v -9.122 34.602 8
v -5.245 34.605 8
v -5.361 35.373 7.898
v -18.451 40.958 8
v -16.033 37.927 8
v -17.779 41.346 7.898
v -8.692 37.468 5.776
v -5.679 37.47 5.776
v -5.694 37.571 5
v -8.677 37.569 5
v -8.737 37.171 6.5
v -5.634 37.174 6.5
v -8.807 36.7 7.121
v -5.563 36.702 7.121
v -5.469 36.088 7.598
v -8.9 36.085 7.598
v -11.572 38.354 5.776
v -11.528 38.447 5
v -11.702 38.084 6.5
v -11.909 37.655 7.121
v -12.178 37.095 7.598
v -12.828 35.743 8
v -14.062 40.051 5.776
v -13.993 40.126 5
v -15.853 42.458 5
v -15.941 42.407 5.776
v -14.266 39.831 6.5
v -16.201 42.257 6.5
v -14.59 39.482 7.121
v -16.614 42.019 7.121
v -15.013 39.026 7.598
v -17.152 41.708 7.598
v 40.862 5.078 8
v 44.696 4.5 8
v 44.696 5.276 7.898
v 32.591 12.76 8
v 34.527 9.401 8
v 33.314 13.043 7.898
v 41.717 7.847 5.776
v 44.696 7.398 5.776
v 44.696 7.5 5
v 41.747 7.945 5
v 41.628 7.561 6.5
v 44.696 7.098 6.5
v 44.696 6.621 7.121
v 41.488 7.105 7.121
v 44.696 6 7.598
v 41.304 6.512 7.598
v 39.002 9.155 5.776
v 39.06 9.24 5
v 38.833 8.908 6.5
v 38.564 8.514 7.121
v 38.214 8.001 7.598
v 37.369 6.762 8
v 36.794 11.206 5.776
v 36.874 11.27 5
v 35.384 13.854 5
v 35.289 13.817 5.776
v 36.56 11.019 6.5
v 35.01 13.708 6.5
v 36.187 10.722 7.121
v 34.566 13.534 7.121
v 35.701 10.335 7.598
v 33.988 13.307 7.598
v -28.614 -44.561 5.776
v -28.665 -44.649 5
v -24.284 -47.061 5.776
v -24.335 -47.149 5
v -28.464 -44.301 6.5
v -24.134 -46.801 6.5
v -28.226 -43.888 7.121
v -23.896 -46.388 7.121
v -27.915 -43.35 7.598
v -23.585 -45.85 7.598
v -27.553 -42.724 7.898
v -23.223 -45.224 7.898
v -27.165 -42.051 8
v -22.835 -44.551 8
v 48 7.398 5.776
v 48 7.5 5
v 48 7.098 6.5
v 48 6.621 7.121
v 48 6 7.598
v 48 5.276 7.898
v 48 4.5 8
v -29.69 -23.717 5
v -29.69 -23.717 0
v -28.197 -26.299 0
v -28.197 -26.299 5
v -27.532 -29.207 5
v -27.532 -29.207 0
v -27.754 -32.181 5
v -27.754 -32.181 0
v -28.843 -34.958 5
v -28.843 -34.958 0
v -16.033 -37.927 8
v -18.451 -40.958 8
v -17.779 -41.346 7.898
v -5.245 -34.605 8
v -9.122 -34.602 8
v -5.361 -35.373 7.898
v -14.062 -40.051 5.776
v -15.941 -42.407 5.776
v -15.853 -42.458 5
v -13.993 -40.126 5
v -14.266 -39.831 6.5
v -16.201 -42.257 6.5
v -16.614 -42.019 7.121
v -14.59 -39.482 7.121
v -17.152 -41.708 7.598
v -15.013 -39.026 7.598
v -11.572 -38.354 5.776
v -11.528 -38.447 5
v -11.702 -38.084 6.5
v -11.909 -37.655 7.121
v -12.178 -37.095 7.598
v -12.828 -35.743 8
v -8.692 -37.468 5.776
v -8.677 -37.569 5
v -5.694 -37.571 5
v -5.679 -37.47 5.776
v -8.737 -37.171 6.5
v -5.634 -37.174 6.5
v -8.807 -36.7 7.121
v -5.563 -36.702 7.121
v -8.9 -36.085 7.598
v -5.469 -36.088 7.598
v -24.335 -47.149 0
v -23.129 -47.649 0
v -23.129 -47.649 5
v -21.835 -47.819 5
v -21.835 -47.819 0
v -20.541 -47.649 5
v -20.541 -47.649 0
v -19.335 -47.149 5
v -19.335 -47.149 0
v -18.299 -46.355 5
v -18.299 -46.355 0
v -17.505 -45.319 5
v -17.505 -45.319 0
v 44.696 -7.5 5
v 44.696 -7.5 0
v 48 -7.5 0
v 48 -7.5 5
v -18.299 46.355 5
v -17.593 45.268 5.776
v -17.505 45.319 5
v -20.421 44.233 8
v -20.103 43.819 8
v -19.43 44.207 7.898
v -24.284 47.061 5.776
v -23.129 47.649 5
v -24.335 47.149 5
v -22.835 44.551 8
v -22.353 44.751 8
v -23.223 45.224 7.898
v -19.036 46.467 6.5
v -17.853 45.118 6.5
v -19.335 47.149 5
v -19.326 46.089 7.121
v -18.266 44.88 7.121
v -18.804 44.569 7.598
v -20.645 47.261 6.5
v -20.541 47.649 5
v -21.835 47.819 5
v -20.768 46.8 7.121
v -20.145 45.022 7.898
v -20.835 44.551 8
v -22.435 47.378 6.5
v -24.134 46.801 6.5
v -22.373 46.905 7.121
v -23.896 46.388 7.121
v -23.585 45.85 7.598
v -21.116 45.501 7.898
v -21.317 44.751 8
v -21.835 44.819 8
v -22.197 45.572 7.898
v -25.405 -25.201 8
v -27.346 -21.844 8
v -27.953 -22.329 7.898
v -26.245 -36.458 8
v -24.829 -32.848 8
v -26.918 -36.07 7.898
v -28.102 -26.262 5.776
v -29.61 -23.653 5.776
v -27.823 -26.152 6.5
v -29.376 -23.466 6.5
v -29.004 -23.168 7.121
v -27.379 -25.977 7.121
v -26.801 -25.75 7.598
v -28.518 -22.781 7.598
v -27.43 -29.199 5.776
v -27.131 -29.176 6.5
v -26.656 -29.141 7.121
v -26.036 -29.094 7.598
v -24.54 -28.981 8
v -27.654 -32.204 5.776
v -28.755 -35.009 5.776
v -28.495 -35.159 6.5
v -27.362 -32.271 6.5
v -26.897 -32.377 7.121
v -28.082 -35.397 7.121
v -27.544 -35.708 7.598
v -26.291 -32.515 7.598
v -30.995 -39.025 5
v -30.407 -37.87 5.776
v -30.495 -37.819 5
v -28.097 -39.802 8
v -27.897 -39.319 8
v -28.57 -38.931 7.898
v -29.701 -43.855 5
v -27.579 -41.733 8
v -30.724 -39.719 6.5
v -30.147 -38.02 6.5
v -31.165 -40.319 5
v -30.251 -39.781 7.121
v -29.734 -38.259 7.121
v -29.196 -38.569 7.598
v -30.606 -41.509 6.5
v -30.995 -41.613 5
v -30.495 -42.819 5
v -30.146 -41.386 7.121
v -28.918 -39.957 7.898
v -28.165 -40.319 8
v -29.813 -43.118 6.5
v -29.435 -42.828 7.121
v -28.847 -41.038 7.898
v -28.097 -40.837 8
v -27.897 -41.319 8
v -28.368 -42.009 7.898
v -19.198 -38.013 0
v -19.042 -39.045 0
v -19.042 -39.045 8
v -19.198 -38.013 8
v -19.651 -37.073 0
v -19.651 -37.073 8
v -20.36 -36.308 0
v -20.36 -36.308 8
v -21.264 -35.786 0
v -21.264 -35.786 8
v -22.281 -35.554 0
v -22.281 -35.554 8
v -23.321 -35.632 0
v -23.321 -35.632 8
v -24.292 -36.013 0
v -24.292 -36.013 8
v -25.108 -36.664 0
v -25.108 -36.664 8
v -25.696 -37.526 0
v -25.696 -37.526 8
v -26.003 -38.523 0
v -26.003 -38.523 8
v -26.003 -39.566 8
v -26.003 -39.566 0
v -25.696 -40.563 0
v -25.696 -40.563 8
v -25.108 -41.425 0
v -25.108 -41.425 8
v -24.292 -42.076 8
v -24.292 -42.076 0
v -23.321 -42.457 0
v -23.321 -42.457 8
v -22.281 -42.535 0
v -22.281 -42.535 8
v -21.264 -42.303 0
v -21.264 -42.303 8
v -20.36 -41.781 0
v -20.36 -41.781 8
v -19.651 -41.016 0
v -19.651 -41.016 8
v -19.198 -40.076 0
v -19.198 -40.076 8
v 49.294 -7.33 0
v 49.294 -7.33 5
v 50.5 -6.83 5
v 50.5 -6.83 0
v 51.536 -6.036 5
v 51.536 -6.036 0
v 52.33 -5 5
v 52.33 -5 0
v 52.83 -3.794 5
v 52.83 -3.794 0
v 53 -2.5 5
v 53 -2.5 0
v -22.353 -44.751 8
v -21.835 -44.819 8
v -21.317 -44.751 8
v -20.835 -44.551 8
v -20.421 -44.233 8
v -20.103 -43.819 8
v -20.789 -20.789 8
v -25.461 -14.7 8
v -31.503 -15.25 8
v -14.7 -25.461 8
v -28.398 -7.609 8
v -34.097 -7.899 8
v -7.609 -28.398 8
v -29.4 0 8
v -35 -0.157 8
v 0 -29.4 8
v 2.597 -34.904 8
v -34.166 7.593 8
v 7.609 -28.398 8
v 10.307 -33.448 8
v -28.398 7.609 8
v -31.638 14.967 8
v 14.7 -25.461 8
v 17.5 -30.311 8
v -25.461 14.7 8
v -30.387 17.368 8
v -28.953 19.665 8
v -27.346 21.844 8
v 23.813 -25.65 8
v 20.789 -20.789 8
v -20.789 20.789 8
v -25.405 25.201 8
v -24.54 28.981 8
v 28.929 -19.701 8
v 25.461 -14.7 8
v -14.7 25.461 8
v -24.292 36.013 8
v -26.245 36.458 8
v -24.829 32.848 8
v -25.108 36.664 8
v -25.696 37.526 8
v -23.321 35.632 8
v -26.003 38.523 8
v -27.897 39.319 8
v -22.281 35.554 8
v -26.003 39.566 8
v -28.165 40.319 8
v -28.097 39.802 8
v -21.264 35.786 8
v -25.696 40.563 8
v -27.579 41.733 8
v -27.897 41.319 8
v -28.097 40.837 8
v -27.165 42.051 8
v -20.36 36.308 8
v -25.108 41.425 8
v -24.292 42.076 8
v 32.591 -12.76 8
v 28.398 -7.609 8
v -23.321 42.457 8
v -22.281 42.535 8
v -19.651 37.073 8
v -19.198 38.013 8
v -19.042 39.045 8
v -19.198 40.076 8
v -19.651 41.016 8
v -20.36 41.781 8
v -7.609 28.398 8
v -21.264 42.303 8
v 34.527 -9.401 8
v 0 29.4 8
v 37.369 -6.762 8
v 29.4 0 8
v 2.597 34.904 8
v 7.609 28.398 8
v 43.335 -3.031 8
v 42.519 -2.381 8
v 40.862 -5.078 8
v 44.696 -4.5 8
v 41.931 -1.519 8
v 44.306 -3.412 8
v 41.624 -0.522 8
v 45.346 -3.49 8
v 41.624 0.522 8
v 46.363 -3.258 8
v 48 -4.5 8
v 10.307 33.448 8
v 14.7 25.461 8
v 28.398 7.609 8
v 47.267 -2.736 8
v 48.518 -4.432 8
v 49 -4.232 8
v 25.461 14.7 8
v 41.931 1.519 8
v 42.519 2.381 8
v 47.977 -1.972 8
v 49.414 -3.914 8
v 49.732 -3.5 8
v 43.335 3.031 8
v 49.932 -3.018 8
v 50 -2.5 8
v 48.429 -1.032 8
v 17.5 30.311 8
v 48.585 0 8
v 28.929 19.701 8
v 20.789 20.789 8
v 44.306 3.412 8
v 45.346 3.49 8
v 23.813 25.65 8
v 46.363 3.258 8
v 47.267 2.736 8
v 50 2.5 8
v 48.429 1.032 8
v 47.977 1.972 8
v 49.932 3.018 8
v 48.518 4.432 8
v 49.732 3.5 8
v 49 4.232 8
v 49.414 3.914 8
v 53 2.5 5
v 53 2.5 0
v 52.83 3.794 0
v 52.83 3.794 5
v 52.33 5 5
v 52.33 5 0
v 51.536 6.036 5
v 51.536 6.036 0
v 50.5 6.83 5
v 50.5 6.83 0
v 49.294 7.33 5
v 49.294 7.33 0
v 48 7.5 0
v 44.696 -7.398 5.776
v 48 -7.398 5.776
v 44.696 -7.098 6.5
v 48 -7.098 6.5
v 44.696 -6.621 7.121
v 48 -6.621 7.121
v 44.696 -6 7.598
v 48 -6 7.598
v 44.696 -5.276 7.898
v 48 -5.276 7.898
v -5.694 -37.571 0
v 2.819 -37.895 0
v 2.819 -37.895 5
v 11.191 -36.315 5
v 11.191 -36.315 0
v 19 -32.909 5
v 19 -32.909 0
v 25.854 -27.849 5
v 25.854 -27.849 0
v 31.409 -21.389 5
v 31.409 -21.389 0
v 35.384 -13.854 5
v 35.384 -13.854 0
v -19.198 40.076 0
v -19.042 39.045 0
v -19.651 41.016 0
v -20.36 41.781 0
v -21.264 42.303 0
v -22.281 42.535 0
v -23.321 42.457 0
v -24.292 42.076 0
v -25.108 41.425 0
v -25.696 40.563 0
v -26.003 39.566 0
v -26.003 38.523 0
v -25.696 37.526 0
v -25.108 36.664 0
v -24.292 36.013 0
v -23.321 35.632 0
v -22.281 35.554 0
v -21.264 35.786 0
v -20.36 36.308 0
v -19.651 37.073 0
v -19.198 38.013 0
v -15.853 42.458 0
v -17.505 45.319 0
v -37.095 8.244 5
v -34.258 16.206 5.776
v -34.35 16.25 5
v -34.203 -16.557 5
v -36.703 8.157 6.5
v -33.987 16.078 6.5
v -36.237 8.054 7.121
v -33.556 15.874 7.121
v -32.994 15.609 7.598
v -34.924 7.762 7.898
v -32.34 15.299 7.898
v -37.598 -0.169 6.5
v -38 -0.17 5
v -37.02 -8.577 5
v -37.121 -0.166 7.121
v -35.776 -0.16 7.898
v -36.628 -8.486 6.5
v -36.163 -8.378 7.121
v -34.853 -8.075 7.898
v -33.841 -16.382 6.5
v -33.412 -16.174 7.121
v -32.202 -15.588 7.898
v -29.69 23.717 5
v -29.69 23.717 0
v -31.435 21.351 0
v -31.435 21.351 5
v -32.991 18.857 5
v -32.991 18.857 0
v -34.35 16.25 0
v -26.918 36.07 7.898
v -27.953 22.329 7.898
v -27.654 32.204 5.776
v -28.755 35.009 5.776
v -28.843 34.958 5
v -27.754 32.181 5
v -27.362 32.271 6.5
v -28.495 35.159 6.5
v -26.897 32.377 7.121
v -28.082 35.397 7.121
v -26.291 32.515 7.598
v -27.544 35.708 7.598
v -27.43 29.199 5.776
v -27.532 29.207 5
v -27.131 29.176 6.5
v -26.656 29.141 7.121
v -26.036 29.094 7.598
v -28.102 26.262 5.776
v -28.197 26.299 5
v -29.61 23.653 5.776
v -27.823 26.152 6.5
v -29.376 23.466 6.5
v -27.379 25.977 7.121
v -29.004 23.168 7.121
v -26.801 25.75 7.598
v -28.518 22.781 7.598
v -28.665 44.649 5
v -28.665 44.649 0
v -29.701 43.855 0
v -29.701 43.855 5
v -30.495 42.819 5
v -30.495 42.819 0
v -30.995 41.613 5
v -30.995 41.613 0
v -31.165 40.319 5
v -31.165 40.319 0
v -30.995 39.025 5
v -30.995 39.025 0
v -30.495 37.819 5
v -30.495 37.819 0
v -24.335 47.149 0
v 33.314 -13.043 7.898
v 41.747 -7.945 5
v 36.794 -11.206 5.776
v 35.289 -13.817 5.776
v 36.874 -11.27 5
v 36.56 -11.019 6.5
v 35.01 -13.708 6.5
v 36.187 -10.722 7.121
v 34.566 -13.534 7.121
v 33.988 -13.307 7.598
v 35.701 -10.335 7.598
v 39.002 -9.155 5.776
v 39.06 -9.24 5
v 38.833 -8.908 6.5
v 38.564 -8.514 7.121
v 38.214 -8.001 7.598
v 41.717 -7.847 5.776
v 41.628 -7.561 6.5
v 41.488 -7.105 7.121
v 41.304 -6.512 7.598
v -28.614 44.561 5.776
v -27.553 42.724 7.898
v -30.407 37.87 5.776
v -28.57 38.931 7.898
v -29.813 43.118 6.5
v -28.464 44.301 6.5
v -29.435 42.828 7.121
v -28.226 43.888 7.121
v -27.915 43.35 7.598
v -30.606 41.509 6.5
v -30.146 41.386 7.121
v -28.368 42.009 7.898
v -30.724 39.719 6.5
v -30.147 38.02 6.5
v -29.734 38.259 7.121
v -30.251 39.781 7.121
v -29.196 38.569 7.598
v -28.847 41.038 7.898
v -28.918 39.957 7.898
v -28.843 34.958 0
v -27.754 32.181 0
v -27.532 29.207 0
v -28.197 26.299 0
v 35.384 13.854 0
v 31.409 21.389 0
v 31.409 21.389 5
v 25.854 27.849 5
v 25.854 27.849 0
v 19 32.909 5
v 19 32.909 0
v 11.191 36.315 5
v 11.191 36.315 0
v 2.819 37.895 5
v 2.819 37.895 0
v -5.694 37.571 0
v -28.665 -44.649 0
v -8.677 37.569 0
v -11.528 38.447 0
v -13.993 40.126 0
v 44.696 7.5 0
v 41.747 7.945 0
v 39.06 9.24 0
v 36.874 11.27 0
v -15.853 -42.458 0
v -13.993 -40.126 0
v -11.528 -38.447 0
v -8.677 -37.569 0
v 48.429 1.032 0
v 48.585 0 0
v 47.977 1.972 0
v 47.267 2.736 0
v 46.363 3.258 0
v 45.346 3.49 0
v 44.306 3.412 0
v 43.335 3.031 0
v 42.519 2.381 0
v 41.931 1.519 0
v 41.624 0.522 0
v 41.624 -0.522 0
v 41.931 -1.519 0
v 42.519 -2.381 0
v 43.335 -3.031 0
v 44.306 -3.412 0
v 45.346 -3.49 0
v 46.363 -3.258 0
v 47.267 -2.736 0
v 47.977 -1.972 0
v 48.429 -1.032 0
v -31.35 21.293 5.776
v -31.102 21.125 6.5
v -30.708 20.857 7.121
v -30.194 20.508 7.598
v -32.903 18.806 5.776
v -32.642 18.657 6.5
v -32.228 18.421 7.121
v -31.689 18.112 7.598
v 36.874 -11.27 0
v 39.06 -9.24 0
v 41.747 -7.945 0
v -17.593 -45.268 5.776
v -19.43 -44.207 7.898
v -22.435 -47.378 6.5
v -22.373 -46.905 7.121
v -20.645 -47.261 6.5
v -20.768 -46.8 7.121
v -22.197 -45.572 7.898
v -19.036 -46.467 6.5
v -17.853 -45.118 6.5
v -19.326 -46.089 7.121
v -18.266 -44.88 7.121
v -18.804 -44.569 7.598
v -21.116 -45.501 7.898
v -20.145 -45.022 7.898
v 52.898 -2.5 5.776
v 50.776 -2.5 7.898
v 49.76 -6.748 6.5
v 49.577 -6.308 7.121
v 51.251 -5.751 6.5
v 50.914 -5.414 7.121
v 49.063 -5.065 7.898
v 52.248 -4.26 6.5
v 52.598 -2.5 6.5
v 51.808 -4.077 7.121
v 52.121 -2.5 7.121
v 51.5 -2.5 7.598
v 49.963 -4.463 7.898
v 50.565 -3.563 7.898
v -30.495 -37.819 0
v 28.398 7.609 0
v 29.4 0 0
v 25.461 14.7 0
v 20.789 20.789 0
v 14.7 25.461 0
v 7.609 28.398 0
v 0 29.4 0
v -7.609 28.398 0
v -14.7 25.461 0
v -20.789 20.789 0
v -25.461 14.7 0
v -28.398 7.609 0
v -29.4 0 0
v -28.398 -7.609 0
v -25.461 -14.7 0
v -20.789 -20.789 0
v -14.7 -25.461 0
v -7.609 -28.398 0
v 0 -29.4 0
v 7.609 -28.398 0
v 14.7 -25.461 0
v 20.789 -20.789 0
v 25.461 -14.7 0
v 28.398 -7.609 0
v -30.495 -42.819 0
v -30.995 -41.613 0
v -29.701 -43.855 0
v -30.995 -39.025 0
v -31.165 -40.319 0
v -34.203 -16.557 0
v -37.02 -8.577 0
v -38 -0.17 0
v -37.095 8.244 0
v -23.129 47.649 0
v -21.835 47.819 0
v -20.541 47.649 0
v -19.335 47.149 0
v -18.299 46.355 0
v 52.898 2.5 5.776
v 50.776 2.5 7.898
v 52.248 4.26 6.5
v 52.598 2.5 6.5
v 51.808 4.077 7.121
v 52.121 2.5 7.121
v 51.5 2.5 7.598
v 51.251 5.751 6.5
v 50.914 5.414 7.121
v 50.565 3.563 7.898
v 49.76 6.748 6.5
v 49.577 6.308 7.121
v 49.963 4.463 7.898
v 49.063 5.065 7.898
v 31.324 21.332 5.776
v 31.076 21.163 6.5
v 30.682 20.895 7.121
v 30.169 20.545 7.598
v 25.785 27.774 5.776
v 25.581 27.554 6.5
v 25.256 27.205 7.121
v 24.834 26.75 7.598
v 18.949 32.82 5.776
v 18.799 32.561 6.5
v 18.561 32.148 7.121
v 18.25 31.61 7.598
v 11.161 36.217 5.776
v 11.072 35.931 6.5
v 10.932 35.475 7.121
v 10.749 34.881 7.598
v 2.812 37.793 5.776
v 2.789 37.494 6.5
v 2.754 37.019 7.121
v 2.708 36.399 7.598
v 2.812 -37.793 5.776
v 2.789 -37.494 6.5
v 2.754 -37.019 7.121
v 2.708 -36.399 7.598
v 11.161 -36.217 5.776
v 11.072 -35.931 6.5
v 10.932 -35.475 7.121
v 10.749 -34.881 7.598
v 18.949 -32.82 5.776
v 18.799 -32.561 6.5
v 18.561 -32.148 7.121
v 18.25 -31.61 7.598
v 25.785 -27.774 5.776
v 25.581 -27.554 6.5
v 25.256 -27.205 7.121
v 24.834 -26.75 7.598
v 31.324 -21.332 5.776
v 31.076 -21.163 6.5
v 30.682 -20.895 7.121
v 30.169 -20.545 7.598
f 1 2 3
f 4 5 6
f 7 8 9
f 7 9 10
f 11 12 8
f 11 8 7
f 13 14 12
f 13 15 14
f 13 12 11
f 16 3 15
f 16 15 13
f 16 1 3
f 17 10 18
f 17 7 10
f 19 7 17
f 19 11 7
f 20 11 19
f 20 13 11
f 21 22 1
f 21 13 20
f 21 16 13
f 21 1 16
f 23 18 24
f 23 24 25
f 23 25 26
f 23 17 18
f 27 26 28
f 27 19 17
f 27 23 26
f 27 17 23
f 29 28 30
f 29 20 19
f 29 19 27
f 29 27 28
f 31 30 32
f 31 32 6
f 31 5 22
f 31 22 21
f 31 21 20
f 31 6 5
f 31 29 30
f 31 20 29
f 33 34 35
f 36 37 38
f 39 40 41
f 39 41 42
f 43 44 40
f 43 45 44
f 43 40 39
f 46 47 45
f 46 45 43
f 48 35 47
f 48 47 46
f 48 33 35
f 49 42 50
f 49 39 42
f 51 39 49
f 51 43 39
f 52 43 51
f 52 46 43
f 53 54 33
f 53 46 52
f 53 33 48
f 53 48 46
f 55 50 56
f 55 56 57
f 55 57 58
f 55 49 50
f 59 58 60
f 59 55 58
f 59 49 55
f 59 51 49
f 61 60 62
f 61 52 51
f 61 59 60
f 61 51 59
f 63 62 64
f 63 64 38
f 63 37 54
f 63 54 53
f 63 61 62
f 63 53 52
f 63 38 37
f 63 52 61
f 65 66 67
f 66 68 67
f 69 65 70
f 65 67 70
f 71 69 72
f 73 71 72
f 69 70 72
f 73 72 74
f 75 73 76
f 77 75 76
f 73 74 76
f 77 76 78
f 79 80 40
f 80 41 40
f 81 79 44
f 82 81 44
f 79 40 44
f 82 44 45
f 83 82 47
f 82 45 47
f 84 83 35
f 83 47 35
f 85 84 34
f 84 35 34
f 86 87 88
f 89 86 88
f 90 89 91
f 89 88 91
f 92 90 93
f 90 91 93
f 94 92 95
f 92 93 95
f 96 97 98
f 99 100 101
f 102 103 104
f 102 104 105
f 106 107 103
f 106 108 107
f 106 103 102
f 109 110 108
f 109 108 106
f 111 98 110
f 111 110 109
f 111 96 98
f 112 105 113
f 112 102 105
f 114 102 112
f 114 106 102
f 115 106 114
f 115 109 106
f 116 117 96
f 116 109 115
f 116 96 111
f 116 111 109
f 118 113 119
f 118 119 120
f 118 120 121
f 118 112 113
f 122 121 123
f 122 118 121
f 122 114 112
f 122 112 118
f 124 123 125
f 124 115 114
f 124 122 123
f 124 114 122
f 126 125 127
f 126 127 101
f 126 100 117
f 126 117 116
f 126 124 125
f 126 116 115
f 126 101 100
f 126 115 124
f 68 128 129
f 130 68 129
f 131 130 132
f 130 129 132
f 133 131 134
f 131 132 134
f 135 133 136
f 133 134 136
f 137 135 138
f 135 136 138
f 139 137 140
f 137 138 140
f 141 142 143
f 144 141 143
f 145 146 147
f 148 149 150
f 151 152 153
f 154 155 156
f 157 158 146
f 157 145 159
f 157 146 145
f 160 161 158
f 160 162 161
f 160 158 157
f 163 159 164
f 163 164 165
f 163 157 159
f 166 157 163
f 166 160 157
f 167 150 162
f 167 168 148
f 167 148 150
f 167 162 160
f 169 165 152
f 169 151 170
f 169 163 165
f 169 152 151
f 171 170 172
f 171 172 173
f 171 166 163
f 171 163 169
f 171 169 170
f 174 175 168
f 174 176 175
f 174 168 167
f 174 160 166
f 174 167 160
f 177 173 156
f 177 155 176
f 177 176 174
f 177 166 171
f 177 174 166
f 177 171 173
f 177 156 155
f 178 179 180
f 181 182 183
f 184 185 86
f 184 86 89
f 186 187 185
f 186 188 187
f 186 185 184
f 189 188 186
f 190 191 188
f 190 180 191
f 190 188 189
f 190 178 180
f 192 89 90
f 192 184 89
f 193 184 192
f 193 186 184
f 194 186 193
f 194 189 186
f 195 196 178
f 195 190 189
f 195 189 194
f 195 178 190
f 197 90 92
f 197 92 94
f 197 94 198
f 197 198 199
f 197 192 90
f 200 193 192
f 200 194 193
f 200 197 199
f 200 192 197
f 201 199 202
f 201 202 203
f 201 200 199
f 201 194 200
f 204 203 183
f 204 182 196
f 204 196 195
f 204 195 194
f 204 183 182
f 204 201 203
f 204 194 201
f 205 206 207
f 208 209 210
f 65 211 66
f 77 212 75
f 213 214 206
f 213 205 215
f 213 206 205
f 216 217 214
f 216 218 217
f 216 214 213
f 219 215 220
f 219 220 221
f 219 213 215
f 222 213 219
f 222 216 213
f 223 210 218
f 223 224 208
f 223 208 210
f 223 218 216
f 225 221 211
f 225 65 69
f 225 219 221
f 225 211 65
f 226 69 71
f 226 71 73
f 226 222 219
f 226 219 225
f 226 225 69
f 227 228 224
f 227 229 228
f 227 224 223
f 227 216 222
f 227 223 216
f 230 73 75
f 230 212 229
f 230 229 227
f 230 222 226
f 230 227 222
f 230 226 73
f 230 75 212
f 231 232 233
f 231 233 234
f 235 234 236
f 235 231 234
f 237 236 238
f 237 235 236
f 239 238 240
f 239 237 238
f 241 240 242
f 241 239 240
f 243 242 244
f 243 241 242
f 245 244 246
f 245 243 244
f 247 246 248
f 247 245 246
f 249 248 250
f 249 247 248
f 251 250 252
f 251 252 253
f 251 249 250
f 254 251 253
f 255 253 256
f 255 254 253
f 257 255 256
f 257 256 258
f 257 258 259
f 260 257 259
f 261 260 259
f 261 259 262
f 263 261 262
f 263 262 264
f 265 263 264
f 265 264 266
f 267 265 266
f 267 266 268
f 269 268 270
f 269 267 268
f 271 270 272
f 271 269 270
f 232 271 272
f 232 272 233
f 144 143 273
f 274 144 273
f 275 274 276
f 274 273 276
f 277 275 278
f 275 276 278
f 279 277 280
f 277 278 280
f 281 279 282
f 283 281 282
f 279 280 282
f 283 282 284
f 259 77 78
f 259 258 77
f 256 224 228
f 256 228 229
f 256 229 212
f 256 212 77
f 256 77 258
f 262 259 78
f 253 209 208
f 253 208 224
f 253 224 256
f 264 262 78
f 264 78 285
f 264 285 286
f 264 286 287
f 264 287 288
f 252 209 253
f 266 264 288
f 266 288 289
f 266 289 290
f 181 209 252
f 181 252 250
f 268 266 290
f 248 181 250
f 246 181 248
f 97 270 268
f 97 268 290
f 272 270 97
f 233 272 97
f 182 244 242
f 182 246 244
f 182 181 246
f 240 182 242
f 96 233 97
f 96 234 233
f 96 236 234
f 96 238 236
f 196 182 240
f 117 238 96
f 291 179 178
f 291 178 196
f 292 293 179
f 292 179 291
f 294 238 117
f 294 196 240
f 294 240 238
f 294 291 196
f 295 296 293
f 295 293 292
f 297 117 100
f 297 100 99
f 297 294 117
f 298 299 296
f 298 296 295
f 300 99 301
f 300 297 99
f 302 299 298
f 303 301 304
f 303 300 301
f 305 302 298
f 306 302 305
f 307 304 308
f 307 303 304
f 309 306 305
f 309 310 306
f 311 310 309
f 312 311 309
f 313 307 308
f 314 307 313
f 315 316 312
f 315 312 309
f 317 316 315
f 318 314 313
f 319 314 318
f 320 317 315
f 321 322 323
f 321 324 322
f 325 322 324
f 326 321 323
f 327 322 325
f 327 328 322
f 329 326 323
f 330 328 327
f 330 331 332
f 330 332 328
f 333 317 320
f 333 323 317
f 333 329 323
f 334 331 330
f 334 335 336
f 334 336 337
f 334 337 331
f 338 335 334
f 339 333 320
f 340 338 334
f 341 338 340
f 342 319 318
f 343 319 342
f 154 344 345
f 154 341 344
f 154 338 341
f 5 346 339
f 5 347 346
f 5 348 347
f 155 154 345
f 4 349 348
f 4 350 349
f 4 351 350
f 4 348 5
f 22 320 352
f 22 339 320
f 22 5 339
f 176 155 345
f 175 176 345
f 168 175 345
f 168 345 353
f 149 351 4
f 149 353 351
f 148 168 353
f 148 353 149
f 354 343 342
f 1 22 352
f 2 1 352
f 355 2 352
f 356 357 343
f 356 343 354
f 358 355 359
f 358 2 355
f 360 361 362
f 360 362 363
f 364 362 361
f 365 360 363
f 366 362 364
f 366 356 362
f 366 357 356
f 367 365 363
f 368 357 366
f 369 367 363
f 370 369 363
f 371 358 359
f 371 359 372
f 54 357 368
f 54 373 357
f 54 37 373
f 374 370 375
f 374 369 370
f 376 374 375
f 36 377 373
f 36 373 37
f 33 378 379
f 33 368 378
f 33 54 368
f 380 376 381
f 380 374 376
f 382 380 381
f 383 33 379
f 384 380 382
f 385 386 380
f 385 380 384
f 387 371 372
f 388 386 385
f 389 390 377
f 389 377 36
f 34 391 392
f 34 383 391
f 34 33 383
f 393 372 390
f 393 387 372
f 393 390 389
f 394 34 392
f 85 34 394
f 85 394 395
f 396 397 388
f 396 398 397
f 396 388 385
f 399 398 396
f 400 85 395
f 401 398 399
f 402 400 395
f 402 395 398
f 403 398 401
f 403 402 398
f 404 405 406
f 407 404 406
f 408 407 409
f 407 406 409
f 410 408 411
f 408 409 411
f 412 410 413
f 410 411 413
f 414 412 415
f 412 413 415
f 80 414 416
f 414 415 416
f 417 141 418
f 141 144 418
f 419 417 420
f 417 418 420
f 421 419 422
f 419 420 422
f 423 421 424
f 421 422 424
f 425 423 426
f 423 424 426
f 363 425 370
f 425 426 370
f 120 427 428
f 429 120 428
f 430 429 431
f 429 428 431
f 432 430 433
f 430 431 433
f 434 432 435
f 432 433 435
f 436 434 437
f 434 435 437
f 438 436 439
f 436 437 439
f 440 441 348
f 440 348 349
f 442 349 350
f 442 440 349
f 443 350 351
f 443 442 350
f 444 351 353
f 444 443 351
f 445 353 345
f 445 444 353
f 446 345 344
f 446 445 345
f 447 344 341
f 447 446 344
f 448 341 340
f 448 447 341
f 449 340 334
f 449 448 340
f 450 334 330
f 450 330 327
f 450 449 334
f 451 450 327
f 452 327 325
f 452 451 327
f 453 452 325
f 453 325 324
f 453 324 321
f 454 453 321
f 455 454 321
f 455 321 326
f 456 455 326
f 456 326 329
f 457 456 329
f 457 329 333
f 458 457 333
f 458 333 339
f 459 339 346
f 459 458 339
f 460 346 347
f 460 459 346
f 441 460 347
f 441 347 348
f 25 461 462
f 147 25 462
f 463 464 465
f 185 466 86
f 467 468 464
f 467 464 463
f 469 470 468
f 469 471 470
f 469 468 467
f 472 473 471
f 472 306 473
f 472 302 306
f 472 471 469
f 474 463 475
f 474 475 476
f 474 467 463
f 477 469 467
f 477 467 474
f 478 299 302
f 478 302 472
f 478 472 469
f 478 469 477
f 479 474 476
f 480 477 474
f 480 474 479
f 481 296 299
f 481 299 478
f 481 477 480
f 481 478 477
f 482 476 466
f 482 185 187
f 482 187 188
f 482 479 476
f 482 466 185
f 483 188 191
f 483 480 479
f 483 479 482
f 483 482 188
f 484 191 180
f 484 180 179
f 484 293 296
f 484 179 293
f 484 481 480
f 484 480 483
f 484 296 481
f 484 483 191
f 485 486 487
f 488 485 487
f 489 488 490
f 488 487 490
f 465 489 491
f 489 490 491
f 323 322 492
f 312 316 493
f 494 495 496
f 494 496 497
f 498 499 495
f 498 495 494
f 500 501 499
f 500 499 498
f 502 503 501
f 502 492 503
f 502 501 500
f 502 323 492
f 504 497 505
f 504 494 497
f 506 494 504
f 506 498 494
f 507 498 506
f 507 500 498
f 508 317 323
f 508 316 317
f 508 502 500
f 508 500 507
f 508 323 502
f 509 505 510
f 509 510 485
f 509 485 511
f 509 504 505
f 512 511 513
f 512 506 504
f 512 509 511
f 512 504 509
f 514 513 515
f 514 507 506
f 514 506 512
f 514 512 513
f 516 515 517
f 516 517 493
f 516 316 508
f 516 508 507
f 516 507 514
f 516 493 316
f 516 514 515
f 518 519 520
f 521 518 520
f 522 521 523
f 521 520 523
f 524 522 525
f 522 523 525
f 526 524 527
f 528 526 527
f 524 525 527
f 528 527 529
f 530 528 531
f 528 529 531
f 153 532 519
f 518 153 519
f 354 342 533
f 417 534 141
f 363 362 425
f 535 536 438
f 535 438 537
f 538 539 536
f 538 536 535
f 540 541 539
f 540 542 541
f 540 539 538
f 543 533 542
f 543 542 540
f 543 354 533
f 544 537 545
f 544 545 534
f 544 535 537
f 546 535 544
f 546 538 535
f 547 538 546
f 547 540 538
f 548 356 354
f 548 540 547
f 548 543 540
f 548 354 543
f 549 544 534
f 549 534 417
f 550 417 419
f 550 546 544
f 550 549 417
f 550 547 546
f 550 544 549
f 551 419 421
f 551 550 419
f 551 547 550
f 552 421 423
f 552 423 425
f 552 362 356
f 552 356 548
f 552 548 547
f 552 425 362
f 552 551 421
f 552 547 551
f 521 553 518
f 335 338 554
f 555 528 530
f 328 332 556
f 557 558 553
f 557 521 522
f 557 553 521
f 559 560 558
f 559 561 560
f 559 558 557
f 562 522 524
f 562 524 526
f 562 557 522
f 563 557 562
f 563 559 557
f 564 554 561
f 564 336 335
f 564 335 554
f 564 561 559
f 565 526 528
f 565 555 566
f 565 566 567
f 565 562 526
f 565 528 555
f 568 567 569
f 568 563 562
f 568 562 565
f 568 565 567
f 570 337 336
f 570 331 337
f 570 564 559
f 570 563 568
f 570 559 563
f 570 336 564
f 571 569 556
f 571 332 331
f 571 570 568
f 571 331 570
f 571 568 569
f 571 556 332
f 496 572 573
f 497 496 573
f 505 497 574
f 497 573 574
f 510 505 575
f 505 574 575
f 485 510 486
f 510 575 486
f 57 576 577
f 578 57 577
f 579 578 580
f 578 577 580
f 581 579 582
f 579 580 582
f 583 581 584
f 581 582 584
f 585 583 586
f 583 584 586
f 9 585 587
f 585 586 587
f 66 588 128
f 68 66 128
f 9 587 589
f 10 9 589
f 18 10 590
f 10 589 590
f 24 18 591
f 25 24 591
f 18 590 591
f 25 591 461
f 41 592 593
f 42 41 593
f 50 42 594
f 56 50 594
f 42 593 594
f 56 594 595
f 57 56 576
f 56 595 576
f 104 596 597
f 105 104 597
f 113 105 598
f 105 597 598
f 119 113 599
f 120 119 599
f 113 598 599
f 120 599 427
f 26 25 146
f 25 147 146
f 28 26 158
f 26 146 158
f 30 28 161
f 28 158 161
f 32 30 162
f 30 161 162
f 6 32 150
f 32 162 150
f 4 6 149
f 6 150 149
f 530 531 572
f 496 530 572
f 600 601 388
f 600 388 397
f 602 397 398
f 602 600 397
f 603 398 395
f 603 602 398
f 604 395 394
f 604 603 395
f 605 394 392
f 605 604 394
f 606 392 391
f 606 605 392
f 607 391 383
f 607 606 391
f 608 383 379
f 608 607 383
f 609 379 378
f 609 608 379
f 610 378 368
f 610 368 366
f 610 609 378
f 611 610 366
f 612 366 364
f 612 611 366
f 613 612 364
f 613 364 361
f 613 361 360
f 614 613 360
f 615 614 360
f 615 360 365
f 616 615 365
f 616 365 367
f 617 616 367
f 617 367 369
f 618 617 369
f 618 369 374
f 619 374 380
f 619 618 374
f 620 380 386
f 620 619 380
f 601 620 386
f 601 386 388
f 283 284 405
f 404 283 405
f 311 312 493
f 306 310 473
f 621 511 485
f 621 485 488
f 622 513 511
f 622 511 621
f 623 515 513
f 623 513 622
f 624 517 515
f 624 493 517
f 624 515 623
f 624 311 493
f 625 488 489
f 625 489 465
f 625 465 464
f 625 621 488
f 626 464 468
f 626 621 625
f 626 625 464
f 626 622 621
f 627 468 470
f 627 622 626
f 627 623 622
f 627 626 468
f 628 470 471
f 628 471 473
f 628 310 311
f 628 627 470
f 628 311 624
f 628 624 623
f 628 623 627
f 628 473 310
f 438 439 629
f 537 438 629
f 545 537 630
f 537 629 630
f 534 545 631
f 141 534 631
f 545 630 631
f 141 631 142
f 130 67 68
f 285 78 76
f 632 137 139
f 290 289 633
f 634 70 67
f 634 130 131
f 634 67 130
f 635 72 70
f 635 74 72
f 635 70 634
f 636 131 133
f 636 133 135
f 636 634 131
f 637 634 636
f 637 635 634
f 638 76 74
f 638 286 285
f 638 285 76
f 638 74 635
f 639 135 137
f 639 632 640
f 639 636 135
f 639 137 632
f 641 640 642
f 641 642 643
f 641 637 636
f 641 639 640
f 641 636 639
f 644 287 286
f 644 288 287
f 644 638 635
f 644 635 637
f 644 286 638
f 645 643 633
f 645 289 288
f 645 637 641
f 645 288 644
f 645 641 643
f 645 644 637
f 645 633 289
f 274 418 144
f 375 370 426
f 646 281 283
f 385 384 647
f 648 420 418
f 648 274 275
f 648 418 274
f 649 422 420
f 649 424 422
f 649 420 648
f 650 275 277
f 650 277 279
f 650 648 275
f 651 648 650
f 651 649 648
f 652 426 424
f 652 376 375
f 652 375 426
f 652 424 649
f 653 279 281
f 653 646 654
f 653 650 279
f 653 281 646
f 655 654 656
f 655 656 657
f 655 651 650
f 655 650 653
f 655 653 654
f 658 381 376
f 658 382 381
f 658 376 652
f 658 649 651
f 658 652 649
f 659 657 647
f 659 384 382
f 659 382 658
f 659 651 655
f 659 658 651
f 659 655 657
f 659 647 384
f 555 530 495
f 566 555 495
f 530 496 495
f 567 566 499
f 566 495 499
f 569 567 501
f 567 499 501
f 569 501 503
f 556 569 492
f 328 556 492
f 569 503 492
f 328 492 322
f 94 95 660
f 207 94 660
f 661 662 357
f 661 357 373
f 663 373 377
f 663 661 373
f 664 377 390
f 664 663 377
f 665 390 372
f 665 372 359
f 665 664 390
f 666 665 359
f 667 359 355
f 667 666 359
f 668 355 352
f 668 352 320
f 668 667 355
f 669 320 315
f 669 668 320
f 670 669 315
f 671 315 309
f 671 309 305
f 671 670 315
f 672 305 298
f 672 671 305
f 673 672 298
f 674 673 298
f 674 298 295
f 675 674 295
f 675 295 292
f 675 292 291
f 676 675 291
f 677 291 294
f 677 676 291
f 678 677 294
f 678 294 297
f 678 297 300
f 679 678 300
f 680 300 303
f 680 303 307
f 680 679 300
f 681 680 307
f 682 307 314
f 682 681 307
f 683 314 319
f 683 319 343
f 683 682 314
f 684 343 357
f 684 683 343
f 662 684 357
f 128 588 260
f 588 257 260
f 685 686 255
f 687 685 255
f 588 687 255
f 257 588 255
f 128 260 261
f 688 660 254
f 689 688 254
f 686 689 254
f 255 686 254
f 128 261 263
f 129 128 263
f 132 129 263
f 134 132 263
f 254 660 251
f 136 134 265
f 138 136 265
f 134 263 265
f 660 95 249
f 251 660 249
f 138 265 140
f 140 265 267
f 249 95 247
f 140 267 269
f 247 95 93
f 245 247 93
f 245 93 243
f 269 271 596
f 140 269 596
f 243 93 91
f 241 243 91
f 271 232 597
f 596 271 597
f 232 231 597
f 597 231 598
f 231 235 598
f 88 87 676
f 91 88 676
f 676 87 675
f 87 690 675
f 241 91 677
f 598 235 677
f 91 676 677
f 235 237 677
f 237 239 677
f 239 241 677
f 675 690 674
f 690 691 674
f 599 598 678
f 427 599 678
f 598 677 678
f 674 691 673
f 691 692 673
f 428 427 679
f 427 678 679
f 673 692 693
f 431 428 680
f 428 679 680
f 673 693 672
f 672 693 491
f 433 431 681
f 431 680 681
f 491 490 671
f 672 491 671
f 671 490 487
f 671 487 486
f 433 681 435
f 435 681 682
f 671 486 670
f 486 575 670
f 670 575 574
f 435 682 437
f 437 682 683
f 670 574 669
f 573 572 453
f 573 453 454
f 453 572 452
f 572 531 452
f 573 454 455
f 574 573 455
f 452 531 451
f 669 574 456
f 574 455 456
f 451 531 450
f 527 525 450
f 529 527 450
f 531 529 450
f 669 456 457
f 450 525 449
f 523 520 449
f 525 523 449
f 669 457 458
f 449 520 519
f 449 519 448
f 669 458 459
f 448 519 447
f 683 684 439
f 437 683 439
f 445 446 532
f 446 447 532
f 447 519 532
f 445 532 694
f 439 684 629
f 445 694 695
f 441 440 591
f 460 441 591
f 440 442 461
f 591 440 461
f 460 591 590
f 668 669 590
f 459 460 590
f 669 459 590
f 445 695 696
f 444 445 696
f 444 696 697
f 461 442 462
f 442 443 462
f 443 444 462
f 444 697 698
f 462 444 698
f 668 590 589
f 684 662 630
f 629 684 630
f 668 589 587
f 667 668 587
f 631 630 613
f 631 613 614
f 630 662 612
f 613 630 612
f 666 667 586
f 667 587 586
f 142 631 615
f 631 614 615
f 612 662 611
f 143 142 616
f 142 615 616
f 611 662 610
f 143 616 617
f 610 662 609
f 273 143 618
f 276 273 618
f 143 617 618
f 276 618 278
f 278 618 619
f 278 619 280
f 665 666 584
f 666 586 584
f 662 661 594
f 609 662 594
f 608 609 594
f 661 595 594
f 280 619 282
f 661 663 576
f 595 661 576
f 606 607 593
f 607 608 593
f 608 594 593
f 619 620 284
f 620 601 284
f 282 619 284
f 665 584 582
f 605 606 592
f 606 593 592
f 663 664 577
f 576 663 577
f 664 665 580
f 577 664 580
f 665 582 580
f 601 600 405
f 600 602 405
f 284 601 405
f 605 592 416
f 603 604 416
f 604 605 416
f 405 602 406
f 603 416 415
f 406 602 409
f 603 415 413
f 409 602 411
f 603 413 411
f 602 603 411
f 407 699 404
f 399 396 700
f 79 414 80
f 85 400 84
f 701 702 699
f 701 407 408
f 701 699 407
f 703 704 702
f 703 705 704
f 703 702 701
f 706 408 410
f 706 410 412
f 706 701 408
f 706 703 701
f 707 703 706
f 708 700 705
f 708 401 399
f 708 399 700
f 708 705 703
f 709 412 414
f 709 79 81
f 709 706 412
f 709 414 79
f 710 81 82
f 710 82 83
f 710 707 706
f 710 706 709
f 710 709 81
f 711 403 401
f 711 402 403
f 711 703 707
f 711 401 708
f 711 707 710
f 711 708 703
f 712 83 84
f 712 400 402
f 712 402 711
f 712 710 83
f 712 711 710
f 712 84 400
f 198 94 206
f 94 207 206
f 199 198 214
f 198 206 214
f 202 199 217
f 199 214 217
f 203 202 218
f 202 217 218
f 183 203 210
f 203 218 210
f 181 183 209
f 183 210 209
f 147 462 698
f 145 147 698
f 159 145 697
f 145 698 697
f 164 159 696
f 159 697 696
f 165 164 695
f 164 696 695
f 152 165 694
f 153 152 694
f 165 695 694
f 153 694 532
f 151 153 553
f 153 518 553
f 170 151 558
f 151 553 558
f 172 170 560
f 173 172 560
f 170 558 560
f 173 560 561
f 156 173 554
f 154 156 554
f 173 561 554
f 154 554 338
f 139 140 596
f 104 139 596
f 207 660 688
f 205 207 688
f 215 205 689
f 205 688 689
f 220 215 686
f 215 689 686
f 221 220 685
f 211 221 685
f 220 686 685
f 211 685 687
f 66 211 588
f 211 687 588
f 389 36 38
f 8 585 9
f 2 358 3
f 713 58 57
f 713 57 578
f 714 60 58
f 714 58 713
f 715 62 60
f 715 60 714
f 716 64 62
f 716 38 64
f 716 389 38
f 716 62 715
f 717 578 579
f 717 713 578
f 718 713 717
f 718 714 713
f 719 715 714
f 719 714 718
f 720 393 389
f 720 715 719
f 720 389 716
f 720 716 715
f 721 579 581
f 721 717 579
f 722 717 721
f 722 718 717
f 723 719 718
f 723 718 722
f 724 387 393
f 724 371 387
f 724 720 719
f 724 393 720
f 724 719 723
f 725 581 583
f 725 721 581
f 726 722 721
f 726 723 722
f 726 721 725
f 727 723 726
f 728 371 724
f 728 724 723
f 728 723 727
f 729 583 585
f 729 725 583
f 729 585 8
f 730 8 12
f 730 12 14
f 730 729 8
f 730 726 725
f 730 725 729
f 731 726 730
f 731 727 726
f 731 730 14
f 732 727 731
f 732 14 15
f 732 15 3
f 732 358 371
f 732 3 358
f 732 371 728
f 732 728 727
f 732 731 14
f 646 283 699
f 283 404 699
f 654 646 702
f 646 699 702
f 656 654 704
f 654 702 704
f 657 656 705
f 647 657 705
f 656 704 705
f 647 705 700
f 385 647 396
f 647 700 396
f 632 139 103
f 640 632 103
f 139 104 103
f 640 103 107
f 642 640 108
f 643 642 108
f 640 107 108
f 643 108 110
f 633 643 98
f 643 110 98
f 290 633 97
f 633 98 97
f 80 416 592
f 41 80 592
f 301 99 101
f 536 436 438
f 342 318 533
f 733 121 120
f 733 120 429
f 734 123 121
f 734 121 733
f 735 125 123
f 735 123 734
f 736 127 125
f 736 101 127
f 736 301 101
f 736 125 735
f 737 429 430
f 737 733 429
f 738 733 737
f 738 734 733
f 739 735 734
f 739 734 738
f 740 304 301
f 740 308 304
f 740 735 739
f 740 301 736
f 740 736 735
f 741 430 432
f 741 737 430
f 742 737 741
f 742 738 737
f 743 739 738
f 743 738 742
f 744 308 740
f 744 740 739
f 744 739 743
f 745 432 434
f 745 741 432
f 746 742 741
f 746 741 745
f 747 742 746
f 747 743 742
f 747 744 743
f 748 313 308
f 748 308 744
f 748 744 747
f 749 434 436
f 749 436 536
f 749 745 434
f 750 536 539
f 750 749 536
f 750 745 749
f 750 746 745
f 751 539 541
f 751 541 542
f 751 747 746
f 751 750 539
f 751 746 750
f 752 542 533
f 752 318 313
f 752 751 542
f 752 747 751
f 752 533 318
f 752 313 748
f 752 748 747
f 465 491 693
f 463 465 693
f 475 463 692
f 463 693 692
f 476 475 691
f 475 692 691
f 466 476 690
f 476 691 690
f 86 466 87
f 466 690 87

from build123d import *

# Parameters (mm, degrees)
SKETCH1_R           = 29.400000026
SKETCH1_R_2         = 3.5
BOSS_EXTRUDE1_DEPTH = 8
FILLET1_R           = 3


with BuildPart() as part:
    # Sketch1 → Boss-Extrude1 (new body)
    with BuildSketch(Plane.XY):
        with BuildLine():
            Line((-28.843288881, -34.9580418), (-30.495190528, -37.819219382))
            ThreePointArc((-30.495190528, -37.819219382), (-30.994692641, -41.613314607), (-28.665063509, -44.649346401))
            Line((-28.665063509, -44.649346401), (-24.334936491, -47.149346401))
            ThreePointArc((-24.334936491, -47.149346401), (-20.540841265, -47.648848513), (-17.504809472, -45.319219382))
            Line((-17.504809472, -45.319219382), (-15.852907825, -42.4580418))
            ThreePointArc((-15.852907825, -42.4580418), (-11.527824655, -38.446588336), (-5.694184248, -37.570949758))
            ThreePointArc((-5.694184248, -37.570949758), (19, -32.908965344), (35.384489059, -13.854166667))
            ThreePointArc((35.384489059, -13.854166667), (39.059634515, -9.239905166), (44.696196706, -7.5))
            Line((44.696196706, -7.5), (48, -7.5))
            ThreePointArc((48, -7.5), (51.535533906, -6.035533906), (53, -2.5))
            Line((53, -2.5), (53, 2.5))
            ThreePointArc((53, 2.5), (51.535533906, 6.035533906), (48, 7.5))
            Line((48, 7.5), (44.696196706, 7.5))
            ThreePointArc((44.696196706, 7.5), (39.059634515, 9.239905166), (35.384489059, 13.854166667))
            ThreePointArc((35.384489059, 13.854166667), (19, 32.908965344), (-5.694184248, 37.570949758))
            ThreePointArc((-5.694184248, 37.570949758), (-11.527824655, 38.446588336), (-15.852907825, 42.4580418))
            Line((-15.852907825, 42.4580418), (-17.504809472, 45.319219382))
            ThreePointArc((-17.504809472, 45.319219382), (-20.540841265, 47.648848513), (-24.334936491, 47.149346401))
            Line((-24.334936491, 47.149346401), (-28.665063509, 44.649346401))
            ThreePointArc((-28.665063509, 44.649346401), (-30.994692641, 41.613314607), (-30.495190528, 37.819219382))
            Line((-30.495190528, 37.819219382), (-28.843288881, 34.9580418))
            ThreePointArc((-28.843288881, 34.9580418), (-27.53180986, 29.20668317), (-29.690304811, 23.716783092))
            ThreePointArc((-29.690304811, 23.716783092), (-32.237173632, 20.118763287), (-34.35021834, 16.25))
            ThreePointArc((-34.35021834, 16.25), (-37.744312009, -4.400785266), (-29.690304811, -23.716783092))
            ThreePointArc((-29.690304811, -23.716783092), (-27.53180986, -29.20668317), (-28.843288881, -34.9580418))
        make_face()
        Circle(SKETCH1_R, mode=Mode.SUBTRACT)
        with Locations((45.084761958, 0)):
            Circle(SKETCH1_R_2, mode=Mode.SUBTRACT)
        with Locations((-22.542380979, -39.044549179)):
            Circle(SKETCH1_R_2, mode=Mode.SUBTRACT)
        with Locations((-22.542380979, 39.044549179)):
            Circle(SKETCH1_R_2, mode=Mode.SUBTRACT)
    extrude(amount=BOSS_EXTRUDE1_DEPTH)

    # Fillet1
    fillet1_edges = [part.edges().sort_by_distance(p)[0] for p in [
        (-27.53180986, 29.20668317, 8),
        (-27.53180986, -29.20668317, 8),
        (-29.669239705, -36.388630591, 8),
        (-30.994692641, -41.613314607, 8),
        (-26.5, -45.899346401, 8),
        (-20.540841265, -47.648848513, 8),
        (-16.678858648, -43.888630591, 8),
        (-11.527824655, -38.446588336, 8),
        (19, -32.908965344, 8),
        (39.059634515, -9.239905166, 8),
        (46.348098353, -7.5, 8),
        (-38, 0, 8),
        (51.535533906, -6.035533906, 8),
        (53, 0, 8),
        (51.535533906, 6.035533906, 8),
        (46.348098353, 7.5, 8),
        (39.059634515, 9.239905166, 8),
        (19, 32.908965344, 8),
        (-11.527824655, 38.446588336, 8),
        (-16.678858648, 43.888630591, 8),
        (-20.540841265, 47.648848513, 8),
        (-26.5, 45.899346401, 8),
        (-30.994692641, 41.613314607, 8),
        (-29.669239705, 36.388630591, 8),
    ]]
    fillet(fillet1_edges, radius=FILLET1_R)


solid = part.part
